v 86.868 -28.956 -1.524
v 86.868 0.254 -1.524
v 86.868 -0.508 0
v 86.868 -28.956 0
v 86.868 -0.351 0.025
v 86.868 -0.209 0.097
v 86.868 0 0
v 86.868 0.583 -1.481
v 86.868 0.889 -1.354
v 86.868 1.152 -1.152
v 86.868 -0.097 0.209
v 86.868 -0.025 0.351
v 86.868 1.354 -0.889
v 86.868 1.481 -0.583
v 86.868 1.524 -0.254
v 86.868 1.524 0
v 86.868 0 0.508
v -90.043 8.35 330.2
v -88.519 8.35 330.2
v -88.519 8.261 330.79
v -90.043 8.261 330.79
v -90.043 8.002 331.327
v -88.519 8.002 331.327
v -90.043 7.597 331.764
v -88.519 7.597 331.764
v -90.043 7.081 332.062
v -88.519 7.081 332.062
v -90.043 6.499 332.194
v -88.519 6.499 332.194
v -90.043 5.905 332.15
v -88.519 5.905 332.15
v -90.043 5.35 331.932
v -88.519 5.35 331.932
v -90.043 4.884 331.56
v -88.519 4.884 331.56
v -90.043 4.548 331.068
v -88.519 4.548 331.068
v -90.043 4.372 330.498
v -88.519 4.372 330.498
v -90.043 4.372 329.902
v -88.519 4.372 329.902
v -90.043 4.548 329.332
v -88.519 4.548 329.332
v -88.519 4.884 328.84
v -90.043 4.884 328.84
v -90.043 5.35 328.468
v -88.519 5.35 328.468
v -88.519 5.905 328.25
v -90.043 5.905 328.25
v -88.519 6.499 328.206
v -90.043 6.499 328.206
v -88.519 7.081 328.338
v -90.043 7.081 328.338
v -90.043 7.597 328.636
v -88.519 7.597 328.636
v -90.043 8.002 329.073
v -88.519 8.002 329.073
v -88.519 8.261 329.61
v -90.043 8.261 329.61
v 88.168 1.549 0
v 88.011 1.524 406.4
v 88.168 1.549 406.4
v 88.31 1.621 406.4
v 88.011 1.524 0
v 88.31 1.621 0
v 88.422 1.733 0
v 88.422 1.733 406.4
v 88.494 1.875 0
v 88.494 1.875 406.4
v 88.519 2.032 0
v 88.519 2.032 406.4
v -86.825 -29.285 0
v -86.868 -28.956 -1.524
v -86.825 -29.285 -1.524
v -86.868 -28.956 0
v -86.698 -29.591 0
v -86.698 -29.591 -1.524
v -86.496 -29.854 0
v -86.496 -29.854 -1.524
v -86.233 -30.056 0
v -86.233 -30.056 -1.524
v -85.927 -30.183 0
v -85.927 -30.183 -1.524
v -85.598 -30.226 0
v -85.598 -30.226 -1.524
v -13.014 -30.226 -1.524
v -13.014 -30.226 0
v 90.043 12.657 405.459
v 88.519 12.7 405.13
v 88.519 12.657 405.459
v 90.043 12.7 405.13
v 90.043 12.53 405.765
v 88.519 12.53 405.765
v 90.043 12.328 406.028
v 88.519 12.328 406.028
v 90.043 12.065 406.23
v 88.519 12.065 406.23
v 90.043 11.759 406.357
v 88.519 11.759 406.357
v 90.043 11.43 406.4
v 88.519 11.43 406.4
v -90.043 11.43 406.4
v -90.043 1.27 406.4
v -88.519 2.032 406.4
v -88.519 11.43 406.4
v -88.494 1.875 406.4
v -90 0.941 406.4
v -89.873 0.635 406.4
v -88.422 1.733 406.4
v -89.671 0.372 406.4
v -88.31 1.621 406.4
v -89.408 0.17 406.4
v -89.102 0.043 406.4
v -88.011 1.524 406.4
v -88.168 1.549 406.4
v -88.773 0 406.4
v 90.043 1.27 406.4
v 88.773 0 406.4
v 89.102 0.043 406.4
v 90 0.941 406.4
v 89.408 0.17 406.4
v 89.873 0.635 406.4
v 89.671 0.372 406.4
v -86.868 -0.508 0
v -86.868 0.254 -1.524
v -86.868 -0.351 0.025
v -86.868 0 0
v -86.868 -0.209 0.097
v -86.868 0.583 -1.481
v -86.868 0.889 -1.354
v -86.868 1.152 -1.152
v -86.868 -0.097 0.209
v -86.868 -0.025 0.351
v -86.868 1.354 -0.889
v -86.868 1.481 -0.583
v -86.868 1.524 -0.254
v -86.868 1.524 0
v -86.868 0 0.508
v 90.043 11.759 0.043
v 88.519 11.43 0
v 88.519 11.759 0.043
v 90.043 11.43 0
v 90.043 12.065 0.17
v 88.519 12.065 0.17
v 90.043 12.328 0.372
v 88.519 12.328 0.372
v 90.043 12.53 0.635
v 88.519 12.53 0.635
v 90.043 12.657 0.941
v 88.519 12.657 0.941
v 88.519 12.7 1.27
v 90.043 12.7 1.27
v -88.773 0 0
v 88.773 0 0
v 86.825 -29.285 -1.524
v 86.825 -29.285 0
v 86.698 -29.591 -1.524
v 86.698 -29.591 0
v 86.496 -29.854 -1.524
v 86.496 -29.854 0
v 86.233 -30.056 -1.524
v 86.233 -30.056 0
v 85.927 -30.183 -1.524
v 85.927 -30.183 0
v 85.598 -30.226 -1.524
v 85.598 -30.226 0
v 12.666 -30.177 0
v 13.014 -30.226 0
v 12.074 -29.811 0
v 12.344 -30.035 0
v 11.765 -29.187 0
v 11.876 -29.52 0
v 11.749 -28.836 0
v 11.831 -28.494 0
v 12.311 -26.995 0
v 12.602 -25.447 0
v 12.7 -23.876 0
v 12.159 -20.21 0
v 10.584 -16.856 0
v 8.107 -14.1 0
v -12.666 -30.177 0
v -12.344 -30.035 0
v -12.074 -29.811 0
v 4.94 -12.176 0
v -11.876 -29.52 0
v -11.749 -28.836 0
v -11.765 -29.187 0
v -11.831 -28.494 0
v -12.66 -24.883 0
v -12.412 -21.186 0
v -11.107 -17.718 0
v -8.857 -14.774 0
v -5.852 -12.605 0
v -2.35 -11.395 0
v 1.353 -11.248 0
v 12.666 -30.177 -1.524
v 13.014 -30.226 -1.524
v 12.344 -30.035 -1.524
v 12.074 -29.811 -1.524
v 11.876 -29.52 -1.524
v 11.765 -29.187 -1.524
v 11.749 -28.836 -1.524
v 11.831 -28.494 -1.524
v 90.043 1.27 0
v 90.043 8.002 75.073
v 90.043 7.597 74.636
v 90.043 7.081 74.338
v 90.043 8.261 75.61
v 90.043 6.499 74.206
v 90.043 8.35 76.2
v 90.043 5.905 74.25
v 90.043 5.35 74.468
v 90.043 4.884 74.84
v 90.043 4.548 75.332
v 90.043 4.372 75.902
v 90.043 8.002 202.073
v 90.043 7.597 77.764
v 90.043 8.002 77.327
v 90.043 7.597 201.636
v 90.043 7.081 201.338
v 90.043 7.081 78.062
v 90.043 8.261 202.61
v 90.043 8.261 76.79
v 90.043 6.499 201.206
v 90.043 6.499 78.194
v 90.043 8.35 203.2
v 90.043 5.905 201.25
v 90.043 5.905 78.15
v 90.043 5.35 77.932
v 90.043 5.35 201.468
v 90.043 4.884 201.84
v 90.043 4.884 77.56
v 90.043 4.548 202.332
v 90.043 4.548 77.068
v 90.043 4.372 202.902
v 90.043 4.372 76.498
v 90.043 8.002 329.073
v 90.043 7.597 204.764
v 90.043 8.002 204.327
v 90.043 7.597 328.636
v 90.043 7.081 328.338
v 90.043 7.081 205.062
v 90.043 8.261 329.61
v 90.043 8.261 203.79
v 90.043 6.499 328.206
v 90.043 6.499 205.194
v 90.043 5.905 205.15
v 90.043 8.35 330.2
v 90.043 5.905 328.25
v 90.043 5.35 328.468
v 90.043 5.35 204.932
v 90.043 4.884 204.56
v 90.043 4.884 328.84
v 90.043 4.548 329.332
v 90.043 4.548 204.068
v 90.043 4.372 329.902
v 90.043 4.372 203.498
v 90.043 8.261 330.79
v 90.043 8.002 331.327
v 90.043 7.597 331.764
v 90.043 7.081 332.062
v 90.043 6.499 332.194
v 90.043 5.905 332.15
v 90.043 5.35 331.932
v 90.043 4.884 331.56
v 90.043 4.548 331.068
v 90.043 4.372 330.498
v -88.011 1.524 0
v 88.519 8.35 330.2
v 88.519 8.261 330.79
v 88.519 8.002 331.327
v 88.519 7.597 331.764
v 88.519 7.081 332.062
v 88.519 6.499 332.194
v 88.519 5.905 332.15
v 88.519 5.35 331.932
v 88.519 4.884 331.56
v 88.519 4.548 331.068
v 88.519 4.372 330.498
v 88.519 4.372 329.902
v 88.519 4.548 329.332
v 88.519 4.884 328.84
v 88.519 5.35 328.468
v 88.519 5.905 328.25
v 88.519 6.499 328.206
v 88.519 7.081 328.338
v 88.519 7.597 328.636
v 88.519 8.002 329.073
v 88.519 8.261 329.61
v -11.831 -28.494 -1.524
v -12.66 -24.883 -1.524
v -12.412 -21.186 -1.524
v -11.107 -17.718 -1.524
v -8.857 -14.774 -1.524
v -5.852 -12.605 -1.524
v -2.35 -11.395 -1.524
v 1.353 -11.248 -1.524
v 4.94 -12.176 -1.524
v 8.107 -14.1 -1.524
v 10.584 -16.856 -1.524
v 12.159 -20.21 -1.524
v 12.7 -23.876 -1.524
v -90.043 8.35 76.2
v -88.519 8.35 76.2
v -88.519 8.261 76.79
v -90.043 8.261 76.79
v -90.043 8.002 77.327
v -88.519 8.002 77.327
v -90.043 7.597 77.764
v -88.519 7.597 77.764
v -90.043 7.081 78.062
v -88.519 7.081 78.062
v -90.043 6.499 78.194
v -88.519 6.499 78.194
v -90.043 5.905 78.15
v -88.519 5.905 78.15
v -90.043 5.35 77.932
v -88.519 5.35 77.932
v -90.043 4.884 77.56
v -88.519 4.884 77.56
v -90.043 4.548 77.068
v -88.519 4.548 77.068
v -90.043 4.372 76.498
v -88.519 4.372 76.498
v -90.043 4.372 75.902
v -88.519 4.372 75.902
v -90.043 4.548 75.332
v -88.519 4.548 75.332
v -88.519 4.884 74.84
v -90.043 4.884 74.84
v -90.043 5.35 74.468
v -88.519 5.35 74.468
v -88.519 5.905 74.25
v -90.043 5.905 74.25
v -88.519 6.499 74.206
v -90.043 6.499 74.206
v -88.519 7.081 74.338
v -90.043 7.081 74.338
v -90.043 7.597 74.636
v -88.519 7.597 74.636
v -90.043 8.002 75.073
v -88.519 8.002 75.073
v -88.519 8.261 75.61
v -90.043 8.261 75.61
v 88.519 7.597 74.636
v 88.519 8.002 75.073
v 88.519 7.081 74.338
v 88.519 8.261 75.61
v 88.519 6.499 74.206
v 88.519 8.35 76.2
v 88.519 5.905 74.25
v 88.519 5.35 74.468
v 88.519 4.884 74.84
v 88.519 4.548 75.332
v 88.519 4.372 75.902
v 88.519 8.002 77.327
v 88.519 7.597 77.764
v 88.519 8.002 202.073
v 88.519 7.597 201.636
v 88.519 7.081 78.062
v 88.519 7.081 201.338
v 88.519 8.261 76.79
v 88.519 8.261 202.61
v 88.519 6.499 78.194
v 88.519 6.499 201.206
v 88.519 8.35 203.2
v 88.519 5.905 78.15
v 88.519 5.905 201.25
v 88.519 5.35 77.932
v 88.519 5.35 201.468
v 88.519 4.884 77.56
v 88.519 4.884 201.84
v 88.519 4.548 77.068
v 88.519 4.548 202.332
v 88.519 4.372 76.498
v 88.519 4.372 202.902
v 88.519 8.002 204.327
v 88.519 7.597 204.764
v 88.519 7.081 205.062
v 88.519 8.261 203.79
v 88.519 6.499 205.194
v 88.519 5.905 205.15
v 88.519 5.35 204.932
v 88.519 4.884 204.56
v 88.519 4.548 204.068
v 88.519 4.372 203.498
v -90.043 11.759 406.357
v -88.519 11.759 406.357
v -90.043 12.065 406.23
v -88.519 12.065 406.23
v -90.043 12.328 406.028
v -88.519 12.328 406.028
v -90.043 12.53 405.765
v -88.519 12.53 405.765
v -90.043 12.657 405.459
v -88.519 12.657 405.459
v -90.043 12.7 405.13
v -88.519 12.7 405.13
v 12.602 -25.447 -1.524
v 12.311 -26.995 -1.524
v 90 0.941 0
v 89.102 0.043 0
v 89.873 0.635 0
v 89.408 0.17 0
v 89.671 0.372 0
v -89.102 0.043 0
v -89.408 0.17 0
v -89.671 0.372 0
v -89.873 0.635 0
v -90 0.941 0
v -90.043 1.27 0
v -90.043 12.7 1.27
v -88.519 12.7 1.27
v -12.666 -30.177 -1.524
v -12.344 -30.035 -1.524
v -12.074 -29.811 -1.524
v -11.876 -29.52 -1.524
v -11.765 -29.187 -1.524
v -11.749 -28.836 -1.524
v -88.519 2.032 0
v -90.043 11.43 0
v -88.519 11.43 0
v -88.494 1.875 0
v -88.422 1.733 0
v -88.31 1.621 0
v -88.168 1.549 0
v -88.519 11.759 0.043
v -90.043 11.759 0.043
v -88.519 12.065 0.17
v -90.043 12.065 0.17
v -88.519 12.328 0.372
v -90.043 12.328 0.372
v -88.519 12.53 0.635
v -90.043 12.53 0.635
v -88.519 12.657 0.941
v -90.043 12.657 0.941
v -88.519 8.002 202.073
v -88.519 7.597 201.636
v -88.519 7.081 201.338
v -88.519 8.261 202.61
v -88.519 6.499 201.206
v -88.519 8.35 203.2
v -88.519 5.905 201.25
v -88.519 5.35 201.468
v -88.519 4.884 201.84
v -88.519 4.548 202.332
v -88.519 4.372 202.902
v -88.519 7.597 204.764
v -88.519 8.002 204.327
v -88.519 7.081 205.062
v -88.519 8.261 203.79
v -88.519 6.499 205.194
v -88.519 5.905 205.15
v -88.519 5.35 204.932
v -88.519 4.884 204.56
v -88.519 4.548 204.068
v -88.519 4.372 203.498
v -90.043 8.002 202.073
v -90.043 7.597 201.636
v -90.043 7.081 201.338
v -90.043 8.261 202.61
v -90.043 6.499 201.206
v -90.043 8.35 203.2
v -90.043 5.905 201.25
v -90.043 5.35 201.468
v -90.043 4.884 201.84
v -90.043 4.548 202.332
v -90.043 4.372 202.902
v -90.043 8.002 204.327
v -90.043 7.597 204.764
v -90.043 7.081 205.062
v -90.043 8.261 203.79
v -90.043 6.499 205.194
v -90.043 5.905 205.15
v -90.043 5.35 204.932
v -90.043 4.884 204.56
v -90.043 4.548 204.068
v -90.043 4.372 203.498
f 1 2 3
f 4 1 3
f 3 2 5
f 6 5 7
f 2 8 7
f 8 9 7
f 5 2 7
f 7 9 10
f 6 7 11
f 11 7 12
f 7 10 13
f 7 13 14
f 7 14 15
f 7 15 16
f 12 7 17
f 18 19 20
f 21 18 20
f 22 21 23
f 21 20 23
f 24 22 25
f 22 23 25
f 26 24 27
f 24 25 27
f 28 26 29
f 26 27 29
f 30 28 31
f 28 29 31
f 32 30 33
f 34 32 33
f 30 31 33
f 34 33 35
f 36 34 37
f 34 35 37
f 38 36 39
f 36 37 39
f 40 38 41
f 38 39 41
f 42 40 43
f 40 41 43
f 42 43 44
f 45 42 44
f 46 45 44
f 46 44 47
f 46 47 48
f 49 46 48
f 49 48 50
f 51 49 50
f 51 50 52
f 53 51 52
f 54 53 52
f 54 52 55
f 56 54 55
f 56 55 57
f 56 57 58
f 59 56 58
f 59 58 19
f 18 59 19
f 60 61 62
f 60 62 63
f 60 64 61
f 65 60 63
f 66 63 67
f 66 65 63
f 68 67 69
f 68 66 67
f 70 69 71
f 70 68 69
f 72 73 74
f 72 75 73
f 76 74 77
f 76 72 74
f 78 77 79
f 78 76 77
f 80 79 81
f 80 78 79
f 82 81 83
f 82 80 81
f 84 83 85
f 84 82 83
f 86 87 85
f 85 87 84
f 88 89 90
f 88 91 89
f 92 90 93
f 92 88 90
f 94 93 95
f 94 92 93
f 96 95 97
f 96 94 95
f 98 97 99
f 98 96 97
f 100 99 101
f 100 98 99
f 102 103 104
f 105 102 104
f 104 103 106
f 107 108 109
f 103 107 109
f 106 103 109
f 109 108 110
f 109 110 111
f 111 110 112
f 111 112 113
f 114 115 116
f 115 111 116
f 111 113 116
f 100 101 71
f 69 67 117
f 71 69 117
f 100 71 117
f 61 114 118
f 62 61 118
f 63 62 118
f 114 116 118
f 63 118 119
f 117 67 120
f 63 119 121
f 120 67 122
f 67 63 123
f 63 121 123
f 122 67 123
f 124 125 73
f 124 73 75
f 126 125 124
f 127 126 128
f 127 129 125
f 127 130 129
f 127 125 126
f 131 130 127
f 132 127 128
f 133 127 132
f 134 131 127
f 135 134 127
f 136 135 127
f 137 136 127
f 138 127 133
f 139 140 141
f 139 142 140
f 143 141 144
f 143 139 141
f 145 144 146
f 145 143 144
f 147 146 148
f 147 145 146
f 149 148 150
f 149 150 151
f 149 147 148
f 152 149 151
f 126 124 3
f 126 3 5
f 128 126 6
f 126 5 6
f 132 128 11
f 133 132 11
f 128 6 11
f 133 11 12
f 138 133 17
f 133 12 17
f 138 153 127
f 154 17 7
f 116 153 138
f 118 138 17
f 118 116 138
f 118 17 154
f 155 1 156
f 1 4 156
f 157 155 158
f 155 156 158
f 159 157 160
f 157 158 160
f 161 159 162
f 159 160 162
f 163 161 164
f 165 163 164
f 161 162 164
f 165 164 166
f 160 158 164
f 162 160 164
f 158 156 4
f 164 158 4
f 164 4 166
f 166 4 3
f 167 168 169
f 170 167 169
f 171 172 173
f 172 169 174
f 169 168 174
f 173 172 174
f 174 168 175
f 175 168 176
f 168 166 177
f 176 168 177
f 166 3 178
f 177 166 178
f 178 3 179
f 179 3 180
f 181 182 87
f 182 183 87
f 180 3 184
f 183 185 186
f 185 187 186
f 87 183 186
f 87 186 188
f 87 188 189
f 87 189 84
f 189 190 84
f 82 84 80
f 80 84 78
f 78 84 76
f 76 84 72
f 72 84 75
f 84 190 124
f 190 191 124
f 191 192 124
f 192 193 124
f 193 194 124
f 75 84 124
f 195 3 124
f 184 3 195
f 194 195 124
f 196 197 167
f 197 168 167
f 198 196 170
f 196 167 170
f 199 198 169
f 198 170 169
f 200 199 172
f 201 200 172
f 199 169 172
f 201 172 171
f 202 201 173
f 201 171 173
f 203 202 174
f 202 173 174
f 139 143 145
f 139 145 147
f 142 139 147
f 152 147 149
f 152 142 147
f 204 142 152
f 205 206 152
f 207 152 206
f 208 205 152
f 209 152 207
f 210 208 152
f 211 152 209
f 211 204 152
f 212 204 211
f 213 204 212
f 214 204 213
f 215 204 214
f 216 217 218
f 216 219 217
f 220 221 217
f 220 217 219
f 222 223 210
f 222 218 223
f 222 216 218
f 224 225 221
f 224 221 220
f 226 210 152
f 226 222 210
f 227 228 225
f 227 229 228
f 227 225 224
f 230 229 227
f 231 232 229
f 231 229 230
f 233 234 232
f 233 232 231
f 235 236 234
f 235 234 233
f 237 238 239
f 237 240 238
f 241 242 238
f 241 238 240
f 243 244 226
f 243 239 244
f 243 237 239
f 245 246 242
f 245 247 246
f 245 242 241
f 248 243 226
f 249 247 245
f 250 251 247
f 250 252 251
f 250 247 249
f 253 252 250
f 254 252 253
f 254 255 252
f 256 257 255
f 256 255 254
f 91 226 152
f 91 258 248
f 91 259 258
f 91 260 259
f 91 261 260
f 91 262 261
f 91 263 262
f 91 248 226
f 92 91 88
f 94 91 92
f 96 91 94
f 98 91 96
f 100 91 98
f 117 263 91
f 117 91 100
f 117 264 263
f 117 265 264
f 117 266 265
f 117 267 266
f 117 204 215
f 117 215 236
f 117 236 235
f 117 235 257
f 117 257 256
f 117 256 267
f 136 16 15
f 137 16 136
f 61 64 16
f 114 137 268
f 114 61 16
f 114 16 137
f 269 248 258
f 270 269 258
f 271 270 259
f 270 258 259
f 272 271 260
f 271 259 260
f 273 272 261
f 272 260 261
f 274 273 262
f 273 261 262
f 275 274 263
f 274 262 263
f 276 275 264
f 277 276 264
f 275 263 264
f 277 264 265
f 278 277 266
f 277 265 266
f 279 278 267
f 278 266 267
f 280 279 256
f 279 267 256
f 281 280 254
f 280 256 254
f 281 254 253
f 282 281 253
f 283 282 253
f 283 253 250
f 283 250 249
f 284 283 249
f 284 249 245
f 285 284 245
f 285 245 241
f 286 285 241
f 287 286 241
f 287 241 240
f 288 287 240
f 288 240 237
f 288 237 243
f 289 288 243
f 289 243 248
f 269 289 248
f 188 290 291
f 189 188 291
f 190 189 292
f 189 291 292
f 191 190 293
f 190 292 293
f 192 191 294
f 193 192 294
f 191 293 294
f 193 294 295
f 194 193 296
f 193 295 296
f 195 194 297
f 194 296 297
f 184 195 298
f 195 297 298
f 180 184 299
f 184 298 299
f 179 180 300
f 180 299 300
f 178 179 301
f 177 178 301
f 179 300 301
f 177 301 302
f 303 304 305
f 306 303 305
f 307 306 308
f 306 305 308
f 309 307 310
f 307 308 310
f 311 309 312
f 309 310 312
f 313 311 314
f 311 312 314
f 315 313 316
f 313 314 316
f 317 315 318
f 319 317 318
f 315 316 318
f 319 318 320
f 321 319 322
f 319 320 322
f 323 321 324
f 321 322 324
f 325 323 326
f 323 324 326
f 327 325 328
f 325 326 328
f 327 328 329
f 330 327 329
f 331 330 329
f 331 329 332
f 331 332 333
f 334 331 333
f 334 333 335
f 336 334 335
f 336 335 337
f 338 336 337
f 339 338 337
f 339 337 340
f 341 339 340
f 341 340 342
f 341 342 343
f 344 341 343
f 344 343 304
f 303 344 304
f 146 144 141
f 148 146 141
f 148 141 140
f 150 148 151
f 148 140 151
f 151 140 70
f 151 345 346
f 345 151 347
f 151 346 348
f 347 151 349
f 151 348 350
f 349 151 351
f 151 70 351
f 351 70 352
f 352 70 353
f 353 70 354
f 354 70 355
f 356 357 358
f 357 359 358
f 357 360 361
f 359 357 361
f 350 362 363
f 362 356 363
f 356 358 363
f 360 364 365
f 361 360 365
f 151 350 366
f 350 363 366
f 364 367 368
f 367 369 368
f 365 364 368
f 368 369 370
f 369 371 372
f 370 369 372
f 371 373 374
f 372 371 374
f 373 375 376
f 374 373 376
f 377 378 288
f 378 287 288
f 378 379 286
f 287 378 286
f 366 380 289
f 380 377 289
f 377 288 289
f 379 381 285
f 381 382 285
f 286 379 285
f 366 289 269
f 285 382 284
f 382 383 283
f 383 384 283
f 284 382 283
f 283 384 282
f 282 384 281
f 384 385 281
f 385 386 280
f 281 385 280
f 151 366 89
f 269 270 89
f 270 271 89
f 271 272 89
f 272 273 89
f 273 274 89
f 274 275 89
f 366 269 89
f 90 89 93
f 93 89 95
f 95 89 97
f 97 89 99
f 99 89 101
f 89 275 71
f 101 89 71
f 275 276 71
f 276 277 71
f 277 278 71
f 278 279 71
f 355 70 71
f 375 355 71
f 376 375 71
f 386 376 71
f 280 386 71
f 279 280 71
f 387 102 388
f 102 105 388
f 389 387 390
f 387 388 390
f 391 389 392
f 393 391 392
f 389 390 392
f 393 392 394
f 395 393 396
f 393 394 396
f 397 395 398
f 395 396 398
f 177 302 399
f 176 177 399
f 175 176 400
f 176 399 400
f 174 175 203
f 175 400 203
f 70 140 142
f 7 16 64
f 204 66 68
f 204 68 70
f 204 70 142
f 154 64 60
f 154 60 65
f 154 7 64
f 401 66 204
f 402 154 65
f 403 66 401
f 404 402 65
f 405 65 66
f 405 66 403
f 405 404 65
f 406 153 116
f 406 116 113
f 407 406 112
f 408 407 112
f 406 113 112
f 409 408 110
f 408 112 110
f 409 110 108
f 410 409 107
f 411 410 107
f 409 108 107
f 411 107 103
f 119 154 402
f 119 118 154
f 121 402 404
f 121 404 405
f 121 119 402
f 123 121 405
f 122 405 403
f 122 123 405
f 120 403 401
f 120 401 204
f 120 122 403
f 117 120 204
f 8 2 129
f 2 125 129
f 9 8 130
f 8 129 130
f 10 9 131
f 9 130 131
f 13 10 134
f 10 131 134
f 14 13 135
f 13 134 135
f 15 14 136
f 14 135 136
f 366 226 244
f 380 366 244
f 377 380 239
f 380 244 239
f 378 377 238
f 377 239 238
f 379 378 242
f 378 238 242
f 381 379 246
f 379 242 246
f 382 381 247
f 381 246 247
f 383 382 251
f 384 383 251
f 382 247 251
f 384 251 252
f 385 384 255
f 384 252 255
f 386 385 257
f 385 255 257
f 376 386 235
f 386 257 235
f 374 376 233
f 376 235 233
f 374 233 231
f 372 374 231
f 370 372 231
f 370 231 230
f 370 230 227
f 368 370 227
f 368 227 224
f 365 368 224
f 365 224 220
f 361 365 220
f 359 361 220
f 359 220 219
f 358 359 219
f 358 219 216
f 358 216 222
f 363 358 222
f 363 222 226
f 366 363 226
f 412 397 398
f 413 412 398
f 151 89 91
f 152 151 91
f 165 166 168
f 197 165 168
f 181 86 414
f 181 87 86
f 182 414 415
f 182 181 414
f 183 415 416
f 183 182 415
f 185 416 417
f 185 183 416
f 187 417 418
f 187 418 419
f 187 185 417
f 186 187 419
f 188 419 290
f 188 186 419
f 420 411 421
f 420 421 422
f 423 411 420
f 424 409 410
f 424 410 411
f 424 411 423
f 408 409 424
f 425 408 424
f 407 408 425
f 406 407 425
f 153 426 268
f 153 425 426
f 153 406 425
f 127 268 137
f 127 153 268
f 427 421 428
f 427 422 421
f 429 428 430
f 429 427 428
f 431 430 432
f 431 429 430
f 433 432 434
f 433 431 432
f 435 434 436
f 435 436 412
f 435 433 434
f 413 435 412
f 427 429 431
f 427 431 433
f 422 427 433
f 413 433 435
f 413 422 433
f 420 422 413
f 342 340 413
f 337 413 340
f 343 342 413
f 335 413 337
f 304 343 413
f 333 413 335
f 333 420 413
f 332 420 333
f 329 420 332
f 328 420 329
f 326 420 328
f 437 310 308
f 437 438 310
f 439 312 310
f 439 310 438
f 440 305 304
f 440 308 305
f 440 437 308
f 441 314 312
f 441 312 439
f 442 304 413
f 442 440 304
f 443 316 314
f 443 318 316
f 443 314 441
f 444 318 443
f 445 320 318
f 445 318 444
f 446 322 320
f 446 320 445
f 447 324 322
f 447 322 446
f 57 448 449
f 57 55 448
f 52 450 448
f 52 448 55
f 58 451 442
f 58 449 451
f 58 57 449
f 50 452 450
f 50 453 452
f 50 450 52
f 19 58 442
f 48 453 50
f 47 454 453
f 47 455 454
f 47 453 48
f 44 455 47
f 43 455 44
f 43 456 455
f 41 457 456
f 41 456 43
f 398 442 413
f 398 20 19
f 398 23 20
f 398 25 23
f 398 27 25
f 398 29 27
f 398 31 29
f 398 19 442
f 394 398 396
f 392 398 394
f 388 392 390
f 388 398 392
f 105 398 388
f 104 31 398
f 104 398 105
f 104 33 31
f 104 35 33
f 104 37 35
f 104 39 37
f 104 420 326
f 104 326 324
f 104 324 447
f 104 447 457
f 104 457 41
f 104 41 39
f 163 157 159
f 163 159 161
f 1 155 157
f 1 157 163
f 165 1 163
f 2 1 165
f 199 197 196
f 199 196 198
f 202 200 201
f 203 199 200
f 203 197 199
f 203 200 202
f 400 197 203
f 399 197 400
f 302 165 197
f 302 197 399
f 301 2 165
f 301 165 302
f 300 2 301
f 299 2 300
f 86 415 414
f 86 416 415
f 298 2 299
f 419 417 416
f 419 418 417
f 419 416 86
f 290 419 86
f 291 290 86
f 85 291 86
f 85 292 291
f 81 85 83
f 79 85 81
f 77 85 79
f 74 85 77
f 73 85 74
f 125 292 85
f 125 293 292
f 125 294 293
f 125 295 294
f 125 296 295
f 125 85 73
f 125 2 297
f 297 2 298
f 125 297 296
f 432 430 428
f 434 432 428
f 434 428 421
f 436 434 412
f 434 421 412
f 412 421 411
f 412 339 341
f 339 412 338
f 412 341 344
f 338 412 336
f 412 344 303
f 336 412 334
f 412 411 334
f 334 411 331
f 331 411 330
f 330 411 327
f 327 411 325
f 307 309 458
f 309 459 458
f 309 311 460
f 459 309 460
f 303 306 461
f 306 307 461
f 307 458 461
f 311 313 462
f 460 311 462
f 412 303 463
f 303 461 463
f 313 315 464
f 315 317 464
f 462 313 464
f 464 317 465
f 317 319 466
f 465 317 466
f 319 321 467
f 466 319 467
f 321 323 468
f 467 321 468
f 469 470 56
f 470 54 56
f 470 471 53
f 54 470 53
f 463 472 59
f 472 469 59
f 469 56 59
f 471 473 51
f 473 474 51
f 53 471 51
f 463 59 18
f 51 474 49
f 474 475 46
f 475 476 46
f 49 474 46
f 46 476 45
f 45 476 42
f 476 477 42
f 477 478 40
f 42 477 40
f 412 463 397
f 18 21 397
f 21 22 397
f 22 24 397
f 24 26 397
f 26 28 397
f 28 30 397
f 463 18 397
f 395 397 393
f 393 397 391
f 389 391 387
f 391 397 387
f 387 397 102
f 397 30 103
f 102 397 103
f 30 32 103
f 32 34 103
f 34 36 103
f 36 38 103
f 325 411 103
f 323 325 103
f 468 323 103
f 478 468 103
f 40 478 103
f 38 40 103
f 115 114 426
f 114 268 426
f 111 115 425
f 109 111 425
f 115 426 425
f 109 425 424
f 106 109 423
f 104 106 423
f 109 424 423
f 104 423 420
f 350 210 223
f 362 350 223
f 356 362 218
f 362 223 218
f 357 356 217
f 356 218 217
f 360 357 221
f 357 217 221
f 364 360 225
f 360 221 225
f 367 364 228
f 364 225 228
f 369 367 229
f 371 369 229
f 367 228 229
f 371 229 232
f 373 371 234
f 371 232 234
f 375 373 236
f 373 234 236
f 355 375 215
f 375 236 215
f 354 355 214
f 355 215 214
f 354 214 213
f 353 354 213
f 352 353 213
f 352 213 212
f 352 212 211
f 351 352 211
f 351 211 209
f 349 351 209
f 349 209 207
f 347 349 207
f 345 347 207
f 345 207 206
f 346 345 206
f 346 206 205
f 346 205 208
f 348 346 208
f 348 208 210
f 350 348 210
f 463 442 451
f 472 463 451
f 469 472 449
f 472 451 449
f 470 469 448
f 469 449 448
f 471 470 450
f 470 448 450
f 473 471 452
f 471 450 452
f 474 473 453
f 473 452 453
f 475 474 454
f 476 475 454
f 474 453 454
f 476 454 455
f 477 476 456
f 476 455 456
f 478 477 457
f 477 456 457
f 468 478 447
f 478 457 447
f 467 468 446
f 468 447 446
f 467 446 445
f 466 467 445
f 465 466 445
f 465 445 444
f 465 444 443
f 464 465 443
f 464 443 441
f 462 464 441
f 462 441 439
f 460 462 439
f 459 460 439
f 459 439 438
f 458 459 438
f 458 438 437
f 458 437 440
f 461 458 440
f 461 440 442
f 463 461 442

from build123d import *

# Parameters (mm, degrees)
F0_W     = 180.086
F0_H     = 406.4
F1_DEPTH = 12.7
F2_T     = -1.524
F3_R     = 2
F4_DEPTH = 180.087
F5_W     = 173.736
F5_H     = 1.524
F6_DEPTH = 31.75
F8_DEPTH = 25.4
F9_R     = 1.27
F10_R    = 0.508


with BuildPart() as f1:
    # F0 (on Front) → F1 (new body)
    with BuildSketch(Plane.XZ):
        with Locations((0, 203.2)):
            Rectangle(F0_W, F0_H)
    extrude(amount=-F1_DEPTH)

    # F2
    f2_openings = [f1.faces().sort_by_distance(p)[0] for p in [
        (0, 6.35, 406.4),
        (0, 6.35, 0),
        (0, 12.7, 203.2),
    ]]
    offset(amount=F2_T, openings=f2_openings)

    # F3 (on face) → F4 (cut, through all)
    with BuildSketch(Plane.YZ.offset(90.043)):
        with Locations((6.35, 76.2)):
            Circle(F3_R)
        with Locations((6.35, 330.2)):
            Circle(F3_R)
        with Locations((6.35, 203.2)):
            Circle(F3_R)
    extrude(amount=-F4_DEPTH, mode=Mode.SUBTRACT)

    # F5 (on face) → F6 (join)
    with BuildSketch(Plane(origin=(0, 1.524, 0), x_dir=(-1, 0, 0), z_dir=(0, 1, 0))):
        with Locations((0, -0.762)):
            Rectangle(F5_W, F5_H)
    extrude(amount=-F6_DEPTH)

    # F7 (on face) → F8 (cut)
    with BuildSketch(Plane(origin=(0, 0, -1.524), x_dir=(1, 0, 0), z_dir=(0, 0, -1))):
        with BuildLine():
            ThreePointArc((-10.9985226281, 30.226), (-3.2870018728, 11.6087420061), (12.7, 23.876))
            ThreePointArc((12.7, 23.876), (12.2672579939, 27.1630018728), (10.9985226281, 30.226))
            Line((10.9985226281, 30.226), (-10.9985226281, 30.226))
        make_face()
    extrude(amount=-F8_DEPTH, mode=Mode.SUBTRACT)

    # F9
    f9_edges = [f1.edges().sort_by_distance(p)[0] for p in [
        (90.043, 0, 203.2),
        (0, 1.524, -1.524),
        (-90.043, 0, 203.2),
        (-10.998523, -30.226, -0.762),
        (10.998523, -30.226, -0.762),
        (-86.868, -30.226, -0.762),
        (86.868, -30.226, -0.762),
        (-89.281, 12.7, 0),
        (89.281, 12.7, 0),
        (89.281, 12.7, 406.4),
        (-89.281, 12.7, 406.4),
    ]]
    fillet(f9_edges, radius=F9_R)

    # F10
    f10_edges = [f1.edges().sort_by_distance(p)[0] for p in [
        (-88.519, 1.524, 203.2),
        (88.519, 1.524, 203.2),
        (0, 0, 0),
    ]]
    fillet(f10_edges, radius=F10_R)


solid = f1.part
